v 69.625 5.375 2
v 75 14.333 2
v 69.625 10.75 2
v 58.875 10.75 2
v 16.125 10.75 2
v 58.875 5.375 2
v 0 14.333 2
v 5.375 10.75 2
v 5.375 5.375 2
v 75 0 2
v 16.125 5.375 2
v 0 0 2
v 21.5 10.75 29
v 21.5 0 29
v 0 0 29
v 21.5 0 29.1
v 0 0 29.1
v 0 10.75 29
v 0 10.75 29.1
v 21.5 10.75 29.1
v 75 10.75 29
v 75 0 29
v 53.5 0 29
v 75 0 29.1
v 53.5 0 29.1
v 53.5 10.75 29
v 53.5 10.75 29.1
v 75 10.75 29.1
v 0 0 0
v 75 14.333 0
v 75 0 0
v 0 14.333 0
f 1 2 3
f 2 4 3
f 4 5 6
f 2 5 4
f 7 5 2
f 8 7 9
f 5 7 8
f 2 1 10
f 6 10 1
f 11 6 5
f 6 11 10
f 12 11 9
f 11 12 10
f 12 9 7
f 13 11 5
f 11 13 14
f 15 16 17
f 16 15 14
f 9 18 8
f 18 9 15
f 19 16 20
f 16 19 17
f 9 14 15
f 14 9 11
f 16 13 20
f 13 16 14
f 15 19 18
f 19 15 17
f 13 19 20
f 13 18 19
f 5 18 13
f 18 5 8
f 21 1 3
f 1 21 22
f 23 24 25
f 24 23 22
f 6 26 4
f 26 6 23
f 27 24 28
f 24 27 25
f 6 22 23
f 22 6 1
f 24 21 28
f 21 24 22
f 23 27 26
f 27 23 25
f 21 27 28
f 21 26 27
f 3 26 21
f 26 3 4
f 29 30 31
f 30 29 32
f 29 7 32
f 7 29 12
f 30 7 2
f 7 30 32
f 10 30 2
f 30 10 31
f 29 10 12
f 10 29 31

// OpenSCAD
$outer_width = 75;
$inner_width = 32;
$holderwidth = ($outer_width - $inner_width) / 2;
$schwertdicke = 27; //schwertdicke ist dicke an der Stelle bis zur Wand (dickste Stelle des Schwertes)
$thickness = 2;
module connector() {
hull() {
    
    translate([$holderwidth / 4,$holderwidth / 4,$thickness])
linear_extrude(height = 0.1)
square([$holderwidth/2, $holderwidth/4]);

translate([0,0,$schwertdicke+$thickness])
linear_extrude(height = 0.1)
square([$holderwidth, $holderwidth/2]);
}
}

connector();
translate([$inner_width+$holderwidth,0,0])
connector();

linear_extrude(height = $thickness)
square([$outer_width, $holderwidth/1.5]);
